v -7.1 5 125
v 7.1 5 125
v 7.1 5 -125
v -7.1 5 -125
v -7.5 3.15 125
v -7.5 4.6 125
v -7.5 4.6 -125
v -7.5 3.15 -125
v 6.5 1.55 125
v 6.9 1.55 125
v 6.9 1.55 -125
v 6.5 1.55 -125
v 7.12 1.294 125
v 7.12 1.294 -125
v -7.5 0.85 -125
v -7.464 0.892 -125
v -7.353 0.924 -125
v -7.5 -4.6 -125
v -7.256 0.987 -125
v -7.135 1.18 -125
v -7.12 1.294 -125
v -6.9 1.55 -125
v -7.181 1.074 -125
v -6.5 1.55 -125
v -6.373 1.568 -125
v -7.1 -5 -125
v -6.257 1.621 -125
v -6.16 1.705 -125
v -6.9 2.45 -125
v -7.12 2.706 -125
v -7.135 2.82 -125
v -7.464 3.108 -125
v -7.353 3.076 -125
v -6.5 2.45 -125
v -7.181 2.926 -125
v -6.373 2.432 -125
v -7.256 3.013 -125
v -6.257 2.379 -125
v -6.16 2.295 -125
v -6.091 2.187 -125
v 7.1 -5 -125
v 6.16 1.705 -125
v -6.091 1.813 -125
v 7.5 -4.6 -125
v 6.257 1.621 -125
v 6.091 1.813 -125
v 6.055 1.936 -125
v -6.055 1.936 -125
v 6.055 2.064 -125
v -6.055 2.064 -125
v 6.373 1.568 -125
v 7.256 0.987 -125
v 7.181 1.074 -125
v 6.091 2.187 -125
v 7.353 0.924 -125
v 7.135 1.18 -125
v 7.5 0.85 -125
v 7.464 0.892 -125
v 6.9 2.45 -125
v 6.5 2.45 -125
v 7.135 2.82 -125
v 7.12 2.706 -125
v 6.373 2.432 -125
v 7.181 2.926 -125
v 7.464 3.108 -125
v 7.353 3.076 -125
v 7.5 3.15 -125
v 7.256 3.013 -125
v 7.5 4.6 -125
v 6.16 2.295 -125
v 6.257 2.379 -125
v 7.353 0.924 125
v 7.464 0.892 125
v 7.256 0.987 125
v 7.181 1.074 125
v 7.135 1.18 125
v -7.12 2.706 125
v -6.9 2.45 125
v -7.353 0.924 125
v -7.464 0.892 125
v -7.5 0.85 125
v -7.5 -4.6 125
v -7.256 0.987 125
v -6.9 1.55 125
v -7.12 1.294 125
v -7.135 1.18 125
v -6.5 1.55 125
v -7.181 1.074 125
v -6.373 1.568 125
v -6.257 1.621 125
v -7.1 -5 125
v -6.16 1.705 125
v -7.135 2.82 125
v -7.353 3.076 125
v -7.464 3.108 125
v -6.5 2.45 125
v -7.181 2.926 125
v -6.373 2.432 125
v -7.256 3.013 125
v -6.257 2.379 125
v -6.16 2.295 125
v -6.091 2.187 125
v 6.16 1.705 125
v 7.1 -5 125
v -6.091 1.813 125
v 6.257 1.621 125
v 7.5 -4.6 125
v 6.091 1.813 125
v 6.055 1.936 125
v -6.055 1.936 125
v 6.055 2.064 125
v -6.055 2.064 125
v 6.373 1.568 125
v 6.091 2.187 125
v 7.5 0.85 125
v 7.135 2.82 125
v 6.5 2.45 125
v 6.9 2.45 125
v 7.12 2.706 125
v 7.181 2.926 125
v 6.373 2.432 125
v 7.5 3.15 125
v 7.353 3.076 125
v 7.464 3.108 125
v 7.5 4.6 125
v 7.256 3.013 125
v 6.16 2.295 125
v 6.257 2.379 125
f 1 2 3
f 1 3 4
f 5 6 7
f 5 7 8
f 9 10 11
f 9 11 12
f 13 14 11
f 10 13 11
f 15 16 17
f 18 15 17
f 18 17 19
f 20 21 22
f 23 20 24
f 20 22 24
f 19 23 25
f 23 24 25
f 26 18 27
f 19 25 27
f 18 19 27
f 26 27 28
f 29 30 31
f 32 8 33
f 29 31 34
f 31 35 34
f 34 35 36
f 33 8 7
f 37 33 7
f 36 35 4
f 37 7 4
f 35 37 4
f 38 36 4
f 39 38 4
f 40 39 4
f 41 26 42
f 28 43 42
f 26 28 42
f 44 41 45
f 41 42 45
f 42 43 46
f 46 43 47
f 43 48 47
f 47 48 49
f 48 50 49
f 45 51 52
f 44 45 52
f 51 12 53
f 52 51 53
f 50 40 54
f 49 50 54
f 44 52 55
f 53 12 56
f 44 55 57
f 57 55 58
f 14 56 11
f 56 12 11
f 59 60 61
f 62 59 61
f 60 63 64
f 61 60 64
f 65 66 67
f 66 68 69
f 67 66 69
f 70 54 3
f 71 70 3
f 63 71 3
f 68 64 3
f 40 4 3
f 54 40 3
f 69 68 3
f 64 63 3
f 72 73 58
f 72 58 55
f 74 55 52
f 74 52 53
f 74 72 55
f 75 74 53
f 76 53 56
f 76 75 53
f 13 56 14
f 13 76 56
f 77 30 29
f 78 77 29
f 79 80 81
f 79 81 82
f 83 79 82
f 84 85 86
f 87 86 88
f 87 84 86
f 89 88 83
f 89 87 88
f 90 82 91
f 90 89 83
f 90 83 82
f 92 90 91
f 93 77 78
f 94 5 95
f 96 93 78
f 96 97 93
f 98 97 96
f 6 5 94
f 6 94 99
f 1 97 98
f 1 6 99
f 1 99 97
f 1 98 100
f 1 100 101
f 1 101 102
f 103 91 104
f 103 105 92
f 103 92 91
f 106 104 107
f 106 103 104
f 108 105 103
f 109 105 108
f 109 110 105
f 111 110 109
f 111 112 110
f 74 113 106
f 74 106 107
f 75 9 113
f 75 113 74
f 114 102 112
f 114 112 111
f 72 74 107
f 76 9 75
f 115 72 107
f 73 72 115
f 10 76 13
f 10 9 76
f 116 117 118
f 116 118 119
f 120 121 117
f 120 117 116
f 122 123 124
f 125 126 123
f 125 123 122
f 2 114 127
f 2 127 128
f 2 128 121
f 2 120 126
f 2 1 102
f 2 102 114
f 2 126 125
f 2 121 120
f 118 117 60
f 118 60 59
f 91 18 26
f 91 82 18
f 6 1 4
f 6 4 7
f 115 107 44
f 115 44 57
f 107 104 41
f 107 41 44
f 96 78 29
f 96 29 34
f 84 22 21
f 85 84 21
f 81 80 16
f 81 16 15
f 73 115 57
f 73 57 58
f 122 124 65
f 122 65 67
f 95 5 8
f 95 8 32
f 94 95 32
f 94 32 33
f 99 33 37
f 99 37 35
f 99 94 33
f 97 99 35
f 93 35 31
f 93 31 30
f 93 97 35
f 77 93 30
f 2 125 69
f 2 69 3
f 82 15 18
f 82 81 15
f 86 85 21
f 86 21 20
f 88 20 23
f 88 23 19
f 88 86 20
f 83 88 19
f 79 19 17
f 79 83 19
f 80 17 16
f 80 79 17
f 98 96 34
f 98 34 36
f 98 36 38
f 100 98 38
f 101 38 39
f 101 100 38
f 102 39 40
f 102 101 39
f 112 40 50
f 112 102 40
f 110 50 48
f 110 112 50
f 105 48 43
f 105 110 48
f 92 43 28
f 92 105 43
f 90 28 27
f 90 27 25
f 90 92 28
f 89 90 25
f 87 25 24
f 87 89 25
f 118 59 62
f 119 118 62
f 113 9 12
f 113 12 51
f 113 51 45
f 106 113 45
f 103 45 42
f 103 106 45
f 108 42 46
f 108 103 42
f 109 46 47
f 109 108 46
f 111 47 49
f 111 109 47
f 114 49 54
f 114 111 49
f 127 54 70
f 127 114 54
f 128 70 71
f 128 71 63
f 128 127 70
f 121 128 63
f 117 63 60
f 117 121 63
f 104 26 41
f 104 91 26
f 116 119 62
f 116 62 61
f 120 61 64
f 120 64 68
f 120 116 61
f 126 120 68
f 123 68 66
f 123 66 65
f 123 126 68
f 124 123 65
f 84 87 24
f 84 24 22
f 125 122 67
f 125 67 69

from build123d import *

# Parameters (mm, degrees)
EXTRUDE_276_DEPTH = 125


with BuildPart() as part:
    # Model → Extrude 276 (new, symmetric)
    with BuildSketch(Plane.XY):
        with BuildLine():
            Line((-7.1, -5), (7.1, -5))
            Line((7.1, -5), (7.5, -4.6))
            Line((7.5, -4.6), (7.5, 0.85))
            Line((7.5, 0.85), (7.463929973, 0.892081698))
            ThreePointArc((7.463929973, 0.892081698), (7.2158211, 1.027882975), (7.119563548, 1.293842528))
            Line((7.119563548, 1.293842528), (6.9, 1.55))
            Line((6.9, 1.55), (6.5, 1.55))
            ThreePointArc((6.5, 1.55), (6.05, 2), (6.5, 2.45))
            Line((6.5, 2.45), (6.9, 2.45))
            Line((6.9, 2.45), (7.119563548, 2.706157472))
            ThreePointArc((7.119563548, 2.706157472), (7.2158211, 2.972117025), (7.463929973, 3.107918302))
            Line((7.463929973, 3.107918302), (7.5, 3.15))
            Line((7.5, 3.15), (7.5, 4.6))
            Line((7.5, 4.6), (7.1, 5))
            Line((7.1, 5), (-7.1, 5))
            Line((-7.1, 5), (-7.5, 4.6))
            Line((-7.5, 4.6), (-7.5, 3.15))
            Line((-7.5, 3.15), (-7.463929973, 3.107918302))
            ThreePointArc((-7.463929973, 3.107918302), (-7.2158211, 2.972117025), (-7.119563548, 2.706157472))
            Line((-7.119563548, 2.706157472), (-6.9, 2.45))
            Line((-6.9, 2.45), (-6.5, 2.45))
            ThreePointArc((-6.5, 2.45), (-6.05, 2), (-6.5, 1.55))
            Line((-6.5, 1.55), (-6.9, 1.55))
            Line((-6.9, 1.55), (-7.119563548, 1.293842528))
            ThreePointArc((-7.119563548, 1.293842528), (-7.2158211, 1.027882975), (-7.463929973, 0.892081698))
            Line((-7.463929973, 0.892081698), (-7.5, 0.85))
            Line((-7.5, 0.85), (-7.5, -4.6))
            Line((-7.5, -4.6), (-7.1, -5))
        make_face()
    extrude(amount=EXTRUDE_276_DEPTH, both=True)


solid = part.part
